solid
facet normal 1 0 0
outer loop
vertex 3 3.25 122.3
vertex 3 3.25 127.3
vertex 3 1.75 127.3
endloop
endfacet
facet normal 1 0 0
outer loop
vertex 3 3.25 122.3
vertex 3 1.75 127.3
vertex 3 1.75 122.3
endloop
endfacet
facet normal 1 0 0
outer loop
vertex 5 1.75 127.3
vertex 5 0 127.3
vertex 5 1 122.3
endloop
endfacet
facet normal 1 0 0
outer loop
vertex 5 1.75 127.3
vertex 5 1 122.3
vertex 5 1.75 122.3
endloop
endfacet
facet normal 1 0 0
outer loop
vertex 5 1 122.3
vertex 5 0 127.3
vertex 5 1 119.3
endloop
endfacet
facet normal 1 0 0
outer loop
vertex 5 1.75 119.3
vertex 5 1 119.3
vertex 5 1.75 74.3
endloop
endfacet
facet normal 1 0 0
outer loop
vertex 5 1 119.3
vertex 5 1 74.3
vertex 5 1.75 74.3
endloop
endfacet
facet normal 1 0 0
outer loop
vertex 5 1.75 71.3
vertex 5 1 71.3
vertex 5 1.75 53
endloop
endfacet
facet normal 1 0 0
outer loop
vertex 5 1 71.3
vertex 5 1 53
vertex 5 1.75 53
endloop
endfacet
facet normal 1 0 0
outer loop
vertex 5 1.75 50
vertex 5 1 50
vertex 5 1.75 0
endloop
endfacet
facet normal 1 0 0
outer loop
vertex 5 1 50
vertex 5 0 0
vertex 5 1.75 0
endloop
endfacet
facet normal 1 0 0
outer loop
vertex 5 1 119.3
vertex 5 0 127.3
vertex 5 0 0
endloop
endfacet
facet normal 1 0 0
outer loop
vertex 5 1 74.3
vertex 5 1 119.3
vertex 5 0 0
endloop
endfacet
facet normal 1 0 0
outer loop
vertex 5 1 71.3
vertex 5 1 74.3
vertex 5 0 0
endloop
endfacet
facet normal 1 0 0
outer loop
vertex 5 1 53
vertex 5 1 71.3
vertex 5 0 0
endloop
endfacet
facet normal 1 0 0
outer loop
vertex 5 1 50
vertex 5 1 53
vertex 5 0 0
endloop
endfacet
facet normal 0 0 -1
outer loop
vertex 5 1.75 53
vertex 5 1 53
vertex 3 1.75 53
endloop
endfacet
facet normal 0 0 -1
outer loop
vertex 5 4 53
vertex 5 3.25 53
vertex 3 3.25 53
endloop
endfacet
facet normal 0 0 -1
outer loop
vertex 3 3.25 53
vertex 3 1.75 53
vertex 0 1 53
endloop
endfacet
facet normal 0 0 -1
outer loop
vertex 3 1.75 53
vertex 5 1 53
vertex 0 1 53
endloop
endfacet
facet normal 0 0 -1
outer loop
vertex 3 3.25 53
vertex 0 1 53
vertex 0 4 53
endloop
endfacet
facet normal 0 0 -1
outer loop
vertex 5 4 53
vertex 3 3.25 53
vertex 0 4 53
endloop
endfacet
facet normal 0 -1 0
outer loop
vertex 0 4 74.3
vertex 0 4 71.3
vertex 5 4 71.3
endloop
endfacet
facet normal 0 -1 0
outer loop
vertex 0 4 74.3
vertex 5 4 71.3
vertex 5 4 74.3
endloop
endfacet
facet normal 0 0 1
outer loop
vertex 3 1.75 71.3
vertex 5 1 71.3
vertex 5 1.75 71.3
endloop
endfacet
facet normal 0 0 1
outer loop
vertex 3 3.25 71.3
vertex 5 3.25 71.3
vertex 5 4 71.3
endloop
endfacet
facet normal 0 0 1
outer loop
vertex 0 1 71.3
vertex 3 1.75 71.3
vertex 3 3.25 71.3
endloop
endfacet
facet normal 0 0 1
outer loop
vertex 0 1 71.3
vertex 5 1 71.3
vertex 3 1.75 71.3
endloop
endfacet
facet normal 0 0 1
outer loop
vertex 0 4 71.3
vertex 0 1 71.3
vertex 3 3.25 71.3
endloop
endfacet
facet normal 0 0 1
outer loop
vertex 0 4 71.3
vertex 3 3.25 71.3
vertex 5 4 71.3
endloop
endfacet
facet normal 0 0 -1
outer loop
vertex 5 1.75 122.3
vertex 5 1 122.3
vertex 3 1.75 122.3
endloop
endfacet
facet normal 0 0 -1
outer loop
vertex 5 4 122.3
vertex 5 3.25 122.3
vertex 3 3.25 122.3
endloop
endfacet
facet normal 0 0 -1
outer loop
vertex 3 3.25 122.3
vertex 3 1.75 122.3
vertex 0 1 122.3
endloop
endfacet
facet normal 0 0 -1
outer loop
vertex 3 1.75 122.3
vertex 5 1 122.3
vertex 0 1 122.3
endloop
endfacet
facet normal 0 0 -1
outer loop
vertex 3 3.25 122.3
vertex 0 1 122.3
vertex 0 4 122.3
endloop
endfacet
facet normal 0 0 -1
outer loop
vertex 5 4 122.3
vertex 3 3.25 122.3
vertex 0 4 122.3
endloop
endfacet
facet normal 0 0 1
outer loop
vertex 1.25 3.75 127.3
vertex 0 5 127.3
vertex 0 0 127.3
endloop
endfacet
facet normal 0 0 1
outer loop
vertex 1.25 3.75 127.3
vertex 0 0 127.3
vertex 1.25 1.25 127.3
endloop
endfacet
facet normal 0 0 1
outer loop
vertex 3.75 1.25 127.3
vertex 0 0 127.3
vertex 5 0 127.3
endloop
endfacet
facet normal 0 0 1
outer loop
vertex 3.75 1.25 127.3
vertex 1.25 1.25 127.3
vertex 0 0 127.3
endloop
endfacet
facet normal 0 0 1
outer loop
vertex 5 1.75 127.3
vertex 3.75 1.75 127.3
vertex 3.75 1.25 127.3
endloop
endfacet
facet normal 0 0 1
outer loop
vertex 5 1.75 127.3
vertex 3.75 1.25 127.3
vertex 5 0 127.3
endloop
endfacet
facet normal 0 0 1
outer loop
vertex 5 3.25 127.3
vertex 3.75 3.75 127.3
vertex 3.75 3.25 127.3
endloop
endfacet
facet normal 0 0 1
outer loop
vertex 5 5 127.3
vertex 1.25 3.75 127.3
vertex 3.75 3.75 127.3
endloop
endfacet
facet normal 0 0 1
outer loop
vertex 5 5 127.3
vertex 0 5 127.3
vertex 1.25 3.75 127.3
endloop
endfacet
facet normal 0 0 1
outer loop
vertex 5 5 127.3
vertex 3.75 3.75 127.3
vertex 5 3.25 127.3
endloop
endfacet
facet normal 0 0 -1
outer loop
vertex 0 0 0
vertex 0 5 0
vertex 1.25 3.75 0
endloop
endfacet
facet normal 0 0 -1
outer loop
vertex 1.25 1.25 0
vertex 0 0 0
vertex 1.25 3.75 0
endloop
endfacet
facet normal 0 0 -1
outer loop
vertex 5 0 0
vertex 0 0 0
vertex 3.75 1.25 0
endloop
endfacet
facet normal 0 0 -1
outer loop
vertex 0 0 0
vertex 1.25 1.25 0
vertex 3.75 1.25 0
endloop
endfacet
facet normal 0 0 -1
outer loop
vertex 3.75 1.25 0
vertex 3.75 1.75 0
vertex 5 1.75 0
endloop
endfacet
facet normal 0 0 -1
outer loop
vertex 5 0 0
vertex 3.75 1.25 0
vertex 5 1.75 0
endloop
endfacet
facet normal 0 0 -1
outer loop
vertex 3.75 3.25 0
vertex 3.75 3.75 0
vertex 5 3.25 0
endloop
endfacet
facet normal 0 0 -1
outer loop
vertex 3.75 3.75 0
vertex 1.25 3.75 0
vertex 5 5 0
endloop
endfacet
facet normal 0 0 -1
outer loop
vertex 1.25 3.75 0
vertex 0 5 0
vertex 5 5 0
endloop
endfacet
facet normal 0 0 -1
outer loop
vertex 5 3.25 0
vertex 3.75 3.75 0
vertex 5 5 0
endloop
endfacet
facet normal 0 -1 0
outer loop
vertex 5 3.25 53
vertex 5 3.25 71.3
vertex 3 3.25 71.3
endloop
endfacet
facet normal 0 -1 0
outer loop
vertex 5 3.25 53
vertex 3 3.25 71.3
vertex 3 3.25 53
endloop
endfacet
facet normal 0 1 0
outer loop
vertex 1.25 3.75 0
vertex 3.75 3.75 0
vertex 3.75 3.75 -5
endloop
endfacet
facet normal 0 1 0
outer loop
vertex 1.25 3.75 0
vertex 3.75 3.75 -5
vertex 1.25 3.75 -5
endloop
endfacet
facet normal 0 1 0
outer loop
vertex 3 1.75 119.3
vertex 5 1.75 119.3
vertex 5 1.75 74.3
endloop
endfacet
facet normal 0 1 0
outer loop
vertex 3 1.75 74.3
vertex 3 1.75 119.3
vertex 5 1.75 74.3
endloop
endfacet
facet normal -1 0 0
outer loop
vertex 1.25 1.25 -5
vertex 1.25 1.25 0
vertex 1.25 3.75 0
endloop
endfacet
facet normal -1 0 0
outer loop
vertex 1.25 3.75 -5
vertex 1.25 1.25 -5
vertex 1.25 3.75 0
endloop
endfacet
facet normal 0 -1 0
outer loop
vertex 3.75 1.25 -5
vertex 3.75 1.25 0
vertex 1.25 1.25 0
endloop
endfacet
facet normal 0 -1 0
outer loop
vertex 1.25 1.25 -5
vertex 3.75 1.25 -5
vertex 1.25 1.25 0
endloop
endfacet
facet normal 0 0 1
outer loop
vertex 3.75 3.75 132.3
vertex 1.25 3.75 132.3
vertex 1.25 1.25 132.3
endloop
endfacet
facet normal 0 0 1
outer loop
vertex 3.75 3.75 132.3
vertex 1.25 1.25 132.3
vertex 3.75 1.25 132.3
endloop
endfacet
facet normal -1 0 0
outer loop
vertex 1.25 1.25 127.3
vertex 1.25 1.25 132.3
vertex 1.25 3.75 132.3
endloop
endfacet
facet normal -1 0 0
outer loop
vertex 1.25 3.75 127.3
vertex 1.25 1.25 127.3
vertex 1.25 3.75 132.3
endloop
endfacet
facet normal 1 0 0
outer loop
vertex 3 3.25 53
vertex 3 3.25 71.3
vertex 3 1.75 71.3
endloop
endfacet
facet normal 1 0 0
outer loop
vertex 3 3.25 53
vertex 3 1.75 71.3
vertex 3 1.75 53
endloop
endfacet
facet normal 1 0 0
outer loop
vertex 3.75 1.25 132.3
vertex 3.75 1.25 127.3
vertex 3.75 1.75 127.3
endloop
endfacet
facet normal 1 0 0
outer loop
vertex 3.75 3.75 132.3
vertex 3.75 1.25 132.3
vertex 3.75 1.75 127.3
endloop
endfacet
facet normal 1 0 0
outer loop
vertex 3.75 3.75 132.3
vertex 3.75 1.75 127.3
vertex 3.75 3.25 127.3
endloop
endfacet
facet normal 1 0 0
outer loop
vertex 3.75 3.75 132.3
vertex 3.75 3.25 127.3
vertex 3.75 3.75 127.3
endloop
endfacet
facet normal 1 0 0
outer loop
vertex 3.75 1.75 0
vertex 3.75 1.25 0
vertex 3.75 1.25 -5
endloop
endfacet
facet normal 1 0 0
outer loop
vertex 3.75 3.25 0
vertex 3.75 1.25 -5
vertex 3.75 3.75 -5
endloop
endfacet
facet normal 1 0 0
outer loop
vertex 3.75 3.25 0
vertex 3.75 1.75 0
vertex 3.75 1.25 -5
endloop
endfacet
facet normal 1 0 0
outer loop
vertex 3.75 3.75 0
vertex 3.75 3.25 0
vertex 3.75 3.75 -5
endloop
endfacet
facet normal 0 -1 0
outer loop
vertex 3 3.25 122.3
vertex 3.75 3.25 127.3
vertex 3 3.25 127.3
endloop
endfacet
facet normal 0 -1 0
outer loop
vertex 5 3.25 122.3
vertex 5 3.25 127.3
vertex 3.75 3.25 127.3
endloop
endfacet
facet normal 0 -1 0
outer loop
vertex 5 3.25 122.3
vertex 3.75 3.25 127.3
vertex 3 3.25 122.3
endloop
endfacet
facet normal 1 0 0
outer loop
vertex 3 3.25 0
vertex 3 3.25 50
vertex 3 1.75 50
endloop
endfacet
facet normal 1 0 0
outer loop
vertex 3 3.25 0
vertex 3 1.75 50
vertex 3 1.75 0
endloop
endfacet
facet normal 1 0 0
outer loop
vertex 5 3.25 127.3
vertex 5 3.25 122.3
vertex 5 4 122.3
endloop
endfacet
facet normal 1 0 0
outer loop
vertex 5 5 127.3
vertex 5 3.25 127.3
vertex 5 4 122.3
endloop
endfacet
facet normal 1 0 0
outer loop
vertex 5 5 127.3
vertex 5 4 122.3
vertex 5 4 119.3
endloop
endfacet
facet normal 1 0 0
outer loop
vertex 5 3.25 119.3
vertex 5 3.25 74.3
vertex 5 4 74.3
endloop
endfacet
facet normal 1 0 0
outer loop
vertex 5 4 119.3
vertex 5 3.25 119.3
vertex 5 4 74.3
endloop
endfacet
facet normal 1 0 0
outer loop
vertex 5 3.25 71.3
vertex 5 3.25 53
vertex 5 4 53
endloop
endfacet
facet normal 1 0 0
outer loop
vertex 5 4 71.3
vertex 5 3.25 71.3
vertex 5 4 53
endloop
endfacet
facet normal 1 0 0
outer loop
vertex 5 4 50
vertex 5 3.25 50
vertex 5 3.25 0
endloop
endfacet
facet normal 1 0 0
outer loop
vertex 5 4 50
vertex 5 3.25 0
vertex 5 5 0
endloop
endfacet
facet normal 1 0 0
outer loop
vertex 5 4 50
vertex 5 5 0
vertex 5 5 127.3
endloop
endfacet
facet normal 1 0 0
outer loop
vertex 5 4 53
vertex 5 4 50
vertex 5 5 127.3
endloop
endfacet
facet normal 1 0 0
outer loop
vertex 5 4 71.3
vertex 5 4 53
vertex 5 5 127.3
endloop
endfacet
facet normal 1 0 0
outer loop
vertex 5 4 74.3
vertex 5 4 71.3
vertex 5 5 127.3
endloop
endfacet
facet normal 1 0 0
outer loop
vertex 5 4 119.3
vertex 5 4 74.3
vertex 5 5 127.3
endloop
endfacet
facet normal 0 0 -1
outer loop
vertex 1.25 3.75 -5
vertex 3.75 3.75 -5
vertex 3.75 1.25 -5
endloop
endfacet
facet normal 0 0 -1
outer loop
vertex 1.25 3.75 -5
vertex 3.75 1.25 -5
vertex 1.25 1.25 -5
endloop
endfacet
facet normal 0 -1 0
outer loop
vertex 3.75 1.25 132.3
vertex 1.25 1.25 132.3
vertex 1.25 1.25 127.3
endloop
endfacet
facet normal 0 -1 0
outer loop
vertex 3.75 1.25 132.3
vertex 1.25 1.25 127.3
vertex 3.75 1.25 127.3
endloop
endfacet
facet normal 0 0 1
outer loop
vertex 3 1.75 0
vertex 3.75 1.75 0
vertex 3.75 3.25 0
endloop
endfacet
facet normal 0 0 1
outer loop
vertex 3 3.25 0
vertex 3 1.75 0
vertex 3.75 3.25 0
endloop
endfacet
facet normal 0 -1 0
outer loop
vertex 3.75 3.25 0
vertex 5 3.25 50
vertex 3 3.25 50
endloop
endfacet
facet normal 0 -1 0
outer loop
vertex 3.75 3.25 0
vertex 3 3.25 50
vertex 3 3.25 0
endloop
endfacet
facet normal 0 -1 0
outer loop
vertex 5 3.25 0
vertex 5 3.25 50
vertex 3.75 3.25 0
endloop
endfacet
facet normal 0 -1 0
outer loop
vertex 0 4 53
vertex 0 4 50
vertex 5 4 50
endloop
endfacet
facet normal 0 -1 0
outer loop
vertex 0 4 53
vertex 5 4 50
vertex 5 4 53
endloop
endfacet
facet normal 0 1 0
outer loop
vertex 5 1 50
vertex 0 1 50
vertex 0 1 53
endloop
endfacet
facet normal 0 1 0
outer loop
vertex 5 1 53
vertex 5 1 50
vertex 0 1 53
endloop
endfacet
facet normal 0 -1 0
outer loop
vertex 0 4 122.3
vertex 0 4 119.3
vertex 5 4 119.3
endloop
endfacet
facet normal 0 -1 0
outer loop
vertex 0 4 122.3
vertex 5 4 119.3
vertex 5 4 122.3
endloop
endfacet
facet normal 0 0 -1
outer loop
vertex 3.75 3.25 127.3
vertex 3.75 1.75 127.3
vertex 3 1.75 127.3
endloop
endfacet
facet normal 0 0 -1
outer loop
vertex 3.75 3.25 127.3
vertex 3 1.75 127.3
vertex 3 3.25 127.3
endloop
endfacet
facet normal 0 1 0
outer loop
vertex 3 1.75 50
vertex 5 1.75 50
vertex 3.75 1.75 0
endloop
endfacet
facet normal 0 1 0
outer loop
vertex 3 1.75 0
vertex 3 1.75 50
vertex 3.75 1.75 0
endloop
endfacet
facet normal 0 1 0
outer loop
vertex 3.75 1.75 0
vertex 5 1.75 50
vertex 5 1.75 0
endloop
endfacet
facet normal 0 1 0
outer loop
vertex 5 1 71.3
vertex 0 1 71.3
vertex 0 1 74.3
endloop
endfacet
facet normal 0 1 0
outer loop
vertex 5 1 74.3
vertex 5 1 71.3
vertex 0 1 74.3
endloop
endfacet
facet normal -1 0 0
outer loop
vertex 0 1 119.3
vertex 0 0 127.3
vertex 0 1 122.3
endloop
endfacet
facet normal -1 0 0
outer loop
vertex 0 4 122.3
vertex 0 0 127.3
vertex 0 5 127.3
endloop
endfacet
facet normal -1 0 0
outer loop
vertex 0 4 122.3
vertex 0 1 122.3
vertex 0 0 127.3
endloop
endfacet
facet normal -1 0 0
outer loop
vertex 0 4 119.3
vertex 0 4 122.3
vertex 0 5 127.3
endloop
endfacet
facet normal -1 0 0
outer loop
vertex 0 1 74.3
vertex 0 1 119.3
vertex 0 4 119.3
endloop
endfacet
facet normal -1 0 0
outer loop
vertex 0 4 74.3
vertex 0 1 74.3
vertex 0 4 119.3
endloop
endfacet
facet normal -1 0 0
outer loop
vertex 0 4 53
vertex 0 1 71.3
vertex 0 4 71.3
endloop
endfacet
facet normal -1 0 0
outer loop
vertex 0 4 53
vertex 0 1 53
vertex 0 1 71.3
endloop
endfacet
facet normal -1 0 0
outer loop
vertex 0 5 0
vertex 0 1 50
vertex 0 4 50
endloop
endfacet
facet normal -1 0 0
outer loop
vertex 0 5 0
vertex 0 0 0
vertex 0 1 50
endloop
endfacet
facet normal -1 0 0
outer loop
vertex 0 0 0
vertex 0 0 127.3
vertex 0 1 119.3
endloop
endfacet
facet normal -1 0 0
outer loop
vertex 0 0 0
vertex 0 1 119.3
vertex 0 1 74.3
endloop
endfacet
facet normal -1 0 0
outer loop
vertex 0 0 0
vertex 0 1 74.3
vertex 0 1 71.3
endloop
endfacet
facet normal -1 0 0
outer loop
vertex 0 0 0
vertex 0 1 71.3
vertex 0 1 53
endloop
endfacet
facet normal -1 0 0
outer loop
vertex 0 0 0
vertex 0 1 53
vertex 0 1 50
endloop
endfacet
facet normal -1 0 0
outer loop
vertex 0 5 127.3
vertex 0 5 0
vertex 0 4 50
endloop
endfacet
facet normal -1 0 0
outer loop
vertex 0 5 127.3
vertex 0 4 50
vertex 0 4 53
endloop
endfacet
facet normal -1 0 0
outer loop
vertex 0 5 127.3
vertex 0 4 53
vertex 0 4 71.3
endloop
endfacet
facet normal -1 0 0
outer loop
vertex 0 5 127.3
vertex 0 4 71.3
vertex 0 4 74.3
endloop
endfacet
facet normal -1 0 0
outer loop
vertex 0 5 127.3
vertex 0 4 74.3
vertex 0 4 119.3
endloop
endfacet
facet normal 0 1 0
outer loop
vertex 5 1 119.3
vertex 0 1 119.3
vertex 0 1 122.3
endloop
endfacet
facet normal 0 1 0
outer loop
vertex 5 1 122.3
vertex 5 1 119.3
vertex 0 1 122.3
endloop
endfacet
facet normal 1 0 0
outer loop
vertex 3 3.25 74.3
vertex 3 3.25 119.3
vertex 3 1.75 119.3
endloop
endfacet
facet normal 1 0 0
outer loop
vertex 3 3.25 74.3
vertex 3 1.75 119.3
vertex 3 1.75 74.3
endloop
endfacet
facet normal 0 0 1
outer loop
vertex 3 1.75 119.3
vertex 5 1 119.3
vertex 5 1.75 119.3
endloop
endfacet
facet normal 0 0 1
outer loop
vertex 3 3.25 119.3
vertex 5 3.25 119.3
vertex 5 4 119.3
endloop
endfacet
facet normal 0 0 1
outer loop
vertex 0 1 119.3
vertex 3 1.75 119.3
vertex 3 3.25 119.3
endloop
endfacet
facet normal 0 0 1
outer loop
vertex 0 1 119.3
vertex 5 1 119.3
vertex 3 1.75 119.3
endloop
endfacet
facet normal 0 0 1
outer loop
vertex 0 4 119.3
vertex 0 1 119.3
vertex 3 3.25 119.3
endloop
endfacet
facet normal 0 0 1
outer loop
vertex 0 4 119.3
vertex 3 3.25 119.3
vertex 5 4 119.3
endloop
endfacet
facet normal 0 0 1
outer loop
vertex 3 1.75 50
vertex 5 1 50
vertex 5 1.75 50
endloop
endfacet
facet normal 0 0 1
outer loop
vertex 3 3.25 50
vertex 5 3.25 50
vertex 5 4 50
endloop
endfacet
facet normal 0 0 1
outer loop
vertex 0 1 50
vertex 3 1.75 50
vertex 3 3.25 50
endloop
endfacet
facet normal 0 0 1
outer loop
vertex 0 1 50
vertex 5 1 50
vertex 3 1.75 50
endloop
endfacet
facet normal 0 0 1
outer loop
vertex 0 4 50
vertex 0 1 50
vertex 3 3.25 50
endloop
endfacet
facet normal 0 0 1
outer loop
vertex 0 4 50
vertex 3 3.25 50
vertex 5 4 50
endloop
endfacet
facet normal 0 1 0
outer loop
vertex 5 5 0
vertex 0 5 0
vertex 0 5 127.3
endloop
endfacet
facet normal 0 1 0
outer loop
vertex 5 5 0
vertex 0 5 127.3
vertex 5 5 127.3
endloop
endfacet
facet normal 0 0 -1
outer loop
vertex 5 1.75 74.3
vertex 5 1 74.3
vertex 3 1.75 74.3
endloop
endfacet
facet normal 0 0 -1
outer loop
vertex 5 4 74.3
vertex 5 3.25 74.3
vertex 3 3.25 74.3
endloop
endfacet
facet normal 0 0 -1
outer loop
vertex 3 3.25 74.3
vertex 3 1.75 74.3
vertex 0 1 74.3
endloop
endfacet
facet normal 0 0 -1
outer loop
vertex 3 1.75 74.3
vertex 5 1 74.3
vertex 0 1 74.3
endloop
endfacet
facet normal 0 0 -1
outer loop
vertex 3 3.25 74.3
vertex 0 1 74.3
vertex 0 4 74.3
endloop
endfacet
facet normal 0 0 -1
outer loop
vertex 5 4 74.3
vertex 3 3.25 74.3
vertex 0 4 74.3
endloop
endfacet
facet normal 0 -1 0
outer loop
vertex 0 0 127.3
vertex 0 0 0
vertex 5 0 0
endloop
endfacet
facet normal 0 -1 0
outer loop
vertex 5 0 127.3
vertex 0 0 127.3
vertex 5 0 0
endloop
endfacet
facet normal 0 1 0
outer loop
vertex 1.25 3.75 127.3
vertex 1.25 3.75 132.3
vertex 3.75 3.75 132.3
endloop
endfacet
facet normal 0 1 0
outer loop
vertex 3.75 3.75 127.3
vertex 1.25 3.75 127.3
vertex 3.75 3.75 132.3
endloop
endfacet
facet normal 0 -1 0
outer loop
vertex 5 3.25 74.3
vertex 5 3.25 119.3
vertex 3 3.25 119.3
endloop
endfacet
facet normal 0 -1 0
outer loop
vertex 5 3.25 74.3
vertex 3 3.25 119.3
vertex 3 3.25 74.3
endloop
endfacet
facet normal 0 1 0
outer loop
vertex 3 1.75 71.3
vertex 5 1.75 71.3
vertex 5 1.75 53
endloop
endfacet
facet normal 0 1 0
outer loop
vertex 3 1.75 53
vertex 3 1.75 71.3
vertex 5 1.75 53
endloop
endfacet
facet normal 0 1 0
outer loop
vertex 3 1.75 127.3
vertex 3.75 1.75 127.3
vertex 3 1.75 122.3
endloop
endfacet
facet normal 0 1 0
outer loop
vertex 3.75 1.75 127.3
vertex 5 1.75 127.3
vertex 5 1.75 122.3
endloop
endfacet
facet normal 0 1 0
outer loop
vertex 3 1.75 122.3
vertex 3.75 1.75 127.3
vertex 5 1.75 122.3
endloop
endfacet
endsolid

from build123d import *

# Parameters (mm, degrees)
SKETCH1_W           = 5
SKETCH1_H           = 5
BOSS_EXTRUDE1_DEPTH = 127.3
SKETCH2_W           = 2.5
SKETCH2_H           = 2.5
BOSS_EXTRUDE2_DEPTH = 5
SKETCH3_W           = 2.5
SKETCH3_H           = 2.5
BOSS_EXTRUDE3_DEPTH = 5
SKETCH4_W           = 3
SKETCH4_H           = 3
CUT_EXTRUDE1_DEPTH  = 30
SKETCH7_W           = 127.3
SKETCH7_H           = 1.5
CUT_EXTRUDE5_DEPTH  = 2


with BuildPart() as part:
    # Sketch1 → Boss-Extrude1 (new body)
    with BuildSketch(Plane.XY):
        with Locations((2.5, 2.5)):
            Rectangle(SKETCH1_W, SKETCH1_H)
    extrude(amount=BOSS_EXTRUDE1_DEPTH)

    # Sketch2 → Boss-Extrude2 (add)
    with BuildSketch(Plane(origin=(0, 0, 0), x_dir=(-1, 0, 0), z_dir=(0, 0, -1))):
        with Locations((-2.5, 2.5)):
            Rectangle(SKETCH2_W, SKETCH2_H)
    extrude(amount=BOSS_EXTRUDE2_DEPTH)

    # Sketch3 → Boss-Extrude3 (add)
    with BuildSketch(Plane.XY.offset(127.3)):
        with Locations((2.5, 2.5)):
            Rectangle(SKETCH3_W, SKETCH3_H)
    extrude(amount=BOSS_EXTRUDE3_DEPTH)

    # Sketch4 → Cut-Extrude1 (cut)
    with BuildSketch(Plane.ZY):
        with Locations((120.8, 2.5)):
            Rectangle(SKETCH4_W, SKETCH4_H)
        with Locations((51.5, 2.5)):
            Rectangle(SKETCH4_W, SKETCH4_H)
        with Locations((72.8, 2.5)):
            Rectangle(SKETCH4_W, SKETCH4_H)
    extrude(amount=-CUT_EXTRUDE1_DEPTH, mode=Mode.SUBTRACT)

    # Sketch7 → Cut-Extrude5 (cut)
    with BuildSketch(Plane(origin=(5, 0, 0), x_dir=(0, 0, -1), z_dir=(1, 0, 0))):
        with Locations((-63.65, 2.5)):
            Rectangle(SKETCH7_W, SKETCH7_H)
    extrude(amount=-CUT_EXTRUDE5_DEPTH, mode=Mode.SUBTRACT)


solid = part.part
